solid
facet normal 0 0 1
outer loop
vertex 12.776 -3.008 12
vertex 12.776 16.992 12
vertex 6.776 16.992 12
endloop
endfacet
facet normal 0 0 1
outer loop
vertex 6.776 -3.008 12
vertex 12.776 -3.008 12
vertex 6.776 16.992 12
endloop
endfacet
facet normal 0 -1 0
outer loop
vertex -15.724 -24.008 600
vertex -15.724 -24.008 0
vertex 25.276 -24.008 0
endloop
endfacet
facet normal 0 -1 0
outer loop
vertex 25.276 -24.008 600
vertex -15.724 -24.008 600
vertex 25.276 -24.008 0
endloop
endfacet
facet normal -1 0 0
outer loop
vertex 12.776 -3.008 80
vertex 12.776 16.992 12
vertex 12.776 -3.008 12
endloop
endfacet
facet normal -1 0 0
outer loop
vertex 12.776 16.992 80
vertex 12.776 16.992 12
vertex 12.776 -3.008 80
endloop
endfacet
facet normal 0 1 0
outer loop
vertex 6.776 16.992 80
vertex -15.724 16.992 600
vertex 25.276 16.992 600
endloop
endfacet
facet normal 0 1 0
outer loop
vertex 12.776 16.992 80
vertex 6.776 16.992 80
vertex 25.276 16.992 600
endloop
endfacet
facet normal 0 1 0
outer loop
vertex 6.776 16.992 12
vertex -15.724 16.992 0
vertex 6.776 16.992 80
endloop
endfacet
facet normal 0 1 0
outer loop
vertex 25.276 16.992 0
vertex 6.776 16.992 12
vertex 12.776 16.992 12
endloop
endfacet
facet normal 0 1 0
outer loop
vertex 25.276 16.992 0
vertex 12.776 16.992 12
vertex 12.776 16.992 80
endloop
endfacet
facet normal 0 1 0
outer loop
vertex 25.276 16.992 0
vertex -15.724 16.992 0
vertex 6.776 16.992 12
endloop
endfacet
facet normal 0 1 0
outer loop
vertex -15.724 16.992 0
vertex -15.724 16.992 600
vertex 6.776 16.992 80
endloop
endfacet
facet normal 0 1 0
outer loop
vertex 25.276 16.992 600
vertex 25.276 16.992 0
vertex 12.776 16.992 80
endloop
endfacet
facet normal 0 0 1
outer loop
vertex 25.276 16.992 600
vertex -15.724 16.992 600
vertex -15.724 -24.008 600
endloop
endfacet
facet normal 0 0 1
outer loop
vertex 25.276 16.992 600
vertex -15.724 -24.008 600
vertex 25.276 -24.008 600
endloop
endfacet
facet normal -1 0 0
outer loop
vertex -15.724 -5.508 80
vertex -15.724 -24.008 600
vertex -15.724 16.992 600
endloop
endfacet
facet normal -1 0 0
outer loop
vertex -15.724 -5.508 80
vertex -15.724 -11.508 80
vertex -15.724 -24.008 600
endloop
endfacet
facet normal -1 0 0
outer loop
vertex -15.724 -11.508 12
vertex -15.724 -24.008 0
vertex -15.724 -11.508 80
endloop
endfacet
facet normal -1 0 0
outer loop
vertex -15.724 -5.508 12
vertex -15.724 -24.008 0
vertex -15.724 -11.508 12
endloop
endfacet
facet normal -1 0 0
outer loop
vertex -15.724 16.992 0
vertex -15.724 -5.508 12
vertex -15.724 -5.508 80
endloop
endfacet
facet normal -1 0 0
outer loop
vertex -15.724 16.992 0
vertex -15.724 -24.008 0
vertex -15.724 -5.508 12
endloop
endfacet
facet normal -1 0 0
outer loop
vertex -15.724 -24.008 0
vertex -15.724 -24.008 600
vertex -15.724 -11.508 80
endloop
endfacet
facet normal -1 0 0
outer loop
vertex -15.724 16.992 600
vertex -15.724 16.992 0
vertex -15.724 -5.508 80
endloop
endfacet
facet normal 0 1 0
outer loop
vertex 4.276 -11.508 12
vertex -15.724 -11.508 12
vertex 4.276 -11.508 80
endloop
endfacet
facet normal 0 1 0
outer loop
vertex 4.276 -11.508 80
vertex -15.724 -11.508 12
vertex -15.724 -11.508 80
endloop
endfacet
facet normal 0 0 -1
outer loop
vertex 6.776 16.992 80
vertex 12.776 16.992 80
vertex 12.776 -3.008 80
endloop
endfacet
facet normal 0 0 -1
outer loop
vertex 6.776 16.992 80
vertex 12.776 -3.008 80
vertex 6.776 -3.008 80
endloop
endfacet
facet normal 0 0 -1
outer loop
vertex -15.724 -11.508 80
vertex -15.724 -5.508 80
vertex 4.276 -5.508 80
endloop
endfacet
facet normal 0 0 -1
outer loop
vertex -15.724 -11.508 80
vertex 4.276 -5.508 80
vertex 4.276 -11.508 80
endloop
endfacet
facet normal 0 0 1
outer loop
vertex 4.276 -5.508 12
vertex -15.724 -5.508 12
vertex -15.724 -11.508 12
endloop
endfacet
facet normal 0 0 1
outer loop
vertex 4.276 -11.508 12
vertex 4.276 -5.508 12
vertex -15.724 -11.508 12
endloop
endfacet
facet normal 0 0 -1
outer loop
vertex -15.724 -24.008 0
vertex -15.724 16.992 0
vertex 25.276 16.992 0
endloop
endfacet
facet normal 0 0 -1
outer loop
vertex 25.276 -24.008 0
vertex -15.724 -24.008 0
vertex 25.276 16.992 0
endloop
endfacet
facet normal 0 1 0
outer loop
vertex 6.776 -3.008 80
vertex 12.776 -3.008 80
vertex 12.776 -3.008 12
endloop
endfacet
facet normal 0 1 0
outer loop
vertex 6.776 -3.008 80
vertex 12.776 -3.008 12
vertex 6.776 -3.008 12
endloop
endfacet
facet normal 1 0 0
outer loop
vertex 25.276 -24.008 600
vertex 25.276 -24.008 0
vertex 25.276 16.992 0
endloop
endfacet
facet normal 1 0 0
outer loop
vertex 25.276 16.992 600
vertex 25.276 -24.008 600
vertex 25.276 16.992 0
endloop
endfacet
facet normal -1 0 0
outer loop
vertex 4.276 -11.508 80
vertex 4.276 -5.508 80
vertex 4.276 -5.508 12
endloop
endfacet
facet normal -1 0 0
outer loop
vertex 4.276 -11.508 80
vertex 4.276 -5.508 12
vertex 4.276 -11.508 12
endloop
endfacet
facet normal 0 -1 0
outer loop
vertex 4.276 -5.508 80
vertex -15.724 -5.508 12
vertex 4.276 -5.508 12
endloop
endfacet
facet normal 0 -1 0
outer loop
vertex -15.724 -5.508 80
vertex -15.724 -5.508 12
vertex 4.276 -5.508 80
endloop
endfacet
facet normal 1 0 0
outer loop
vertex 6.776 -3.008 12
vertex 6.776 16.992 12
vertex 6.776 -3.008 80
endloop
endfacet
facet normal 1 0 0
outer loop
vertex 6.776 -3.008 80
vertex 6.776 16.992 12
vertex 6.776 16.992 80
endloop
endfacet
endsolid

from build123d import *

# Parameters (mm, degrees)
F0_W     = 41
F0_H     = 41
F1_DEPTH = 600
F2_W     = 6
F2_H     = 68
F3_DEPTH = 20
F4_W     = 6
F4_H     = 68
F5_DEPTH = 20


with BuildPart() as f1:
    # F0 (on Top) → F1 (new body)
    with BuildSketch(Plane.XY):
        with Locations((4.776136, -3.508085)):
            Rectangle(F0_W, F0_H)
    extrude(amount=F1_DEPTH)

    # F2 (on face) → F3 (cut)
    with BuildSketch(Plane(origin=(-15.723864, 0, 0), x_dir=(0, -1, 0), z_dir=(-1, 0, 0))):
        with Locations((8.508085, 46)):
            Rectangle(F2_W, F2_H)
    extrude(amount=-F3_DEPTH, mode=Mode.SUBTRACT)

    # F4 (on face) → F5 (cut)
    with BuildSketch(Plane(origin=(0, 16.991915, 0), x_dir=(-1, 0, 0), z_dir=(0, 1, 0))):
        with Locations((-9.776136, 46)):
            Rectangle(F4_W, F4_H)
    extrude(amount=-F5_DEPTH, mode=Mode.SUBTRACT)


solid = f1.part
